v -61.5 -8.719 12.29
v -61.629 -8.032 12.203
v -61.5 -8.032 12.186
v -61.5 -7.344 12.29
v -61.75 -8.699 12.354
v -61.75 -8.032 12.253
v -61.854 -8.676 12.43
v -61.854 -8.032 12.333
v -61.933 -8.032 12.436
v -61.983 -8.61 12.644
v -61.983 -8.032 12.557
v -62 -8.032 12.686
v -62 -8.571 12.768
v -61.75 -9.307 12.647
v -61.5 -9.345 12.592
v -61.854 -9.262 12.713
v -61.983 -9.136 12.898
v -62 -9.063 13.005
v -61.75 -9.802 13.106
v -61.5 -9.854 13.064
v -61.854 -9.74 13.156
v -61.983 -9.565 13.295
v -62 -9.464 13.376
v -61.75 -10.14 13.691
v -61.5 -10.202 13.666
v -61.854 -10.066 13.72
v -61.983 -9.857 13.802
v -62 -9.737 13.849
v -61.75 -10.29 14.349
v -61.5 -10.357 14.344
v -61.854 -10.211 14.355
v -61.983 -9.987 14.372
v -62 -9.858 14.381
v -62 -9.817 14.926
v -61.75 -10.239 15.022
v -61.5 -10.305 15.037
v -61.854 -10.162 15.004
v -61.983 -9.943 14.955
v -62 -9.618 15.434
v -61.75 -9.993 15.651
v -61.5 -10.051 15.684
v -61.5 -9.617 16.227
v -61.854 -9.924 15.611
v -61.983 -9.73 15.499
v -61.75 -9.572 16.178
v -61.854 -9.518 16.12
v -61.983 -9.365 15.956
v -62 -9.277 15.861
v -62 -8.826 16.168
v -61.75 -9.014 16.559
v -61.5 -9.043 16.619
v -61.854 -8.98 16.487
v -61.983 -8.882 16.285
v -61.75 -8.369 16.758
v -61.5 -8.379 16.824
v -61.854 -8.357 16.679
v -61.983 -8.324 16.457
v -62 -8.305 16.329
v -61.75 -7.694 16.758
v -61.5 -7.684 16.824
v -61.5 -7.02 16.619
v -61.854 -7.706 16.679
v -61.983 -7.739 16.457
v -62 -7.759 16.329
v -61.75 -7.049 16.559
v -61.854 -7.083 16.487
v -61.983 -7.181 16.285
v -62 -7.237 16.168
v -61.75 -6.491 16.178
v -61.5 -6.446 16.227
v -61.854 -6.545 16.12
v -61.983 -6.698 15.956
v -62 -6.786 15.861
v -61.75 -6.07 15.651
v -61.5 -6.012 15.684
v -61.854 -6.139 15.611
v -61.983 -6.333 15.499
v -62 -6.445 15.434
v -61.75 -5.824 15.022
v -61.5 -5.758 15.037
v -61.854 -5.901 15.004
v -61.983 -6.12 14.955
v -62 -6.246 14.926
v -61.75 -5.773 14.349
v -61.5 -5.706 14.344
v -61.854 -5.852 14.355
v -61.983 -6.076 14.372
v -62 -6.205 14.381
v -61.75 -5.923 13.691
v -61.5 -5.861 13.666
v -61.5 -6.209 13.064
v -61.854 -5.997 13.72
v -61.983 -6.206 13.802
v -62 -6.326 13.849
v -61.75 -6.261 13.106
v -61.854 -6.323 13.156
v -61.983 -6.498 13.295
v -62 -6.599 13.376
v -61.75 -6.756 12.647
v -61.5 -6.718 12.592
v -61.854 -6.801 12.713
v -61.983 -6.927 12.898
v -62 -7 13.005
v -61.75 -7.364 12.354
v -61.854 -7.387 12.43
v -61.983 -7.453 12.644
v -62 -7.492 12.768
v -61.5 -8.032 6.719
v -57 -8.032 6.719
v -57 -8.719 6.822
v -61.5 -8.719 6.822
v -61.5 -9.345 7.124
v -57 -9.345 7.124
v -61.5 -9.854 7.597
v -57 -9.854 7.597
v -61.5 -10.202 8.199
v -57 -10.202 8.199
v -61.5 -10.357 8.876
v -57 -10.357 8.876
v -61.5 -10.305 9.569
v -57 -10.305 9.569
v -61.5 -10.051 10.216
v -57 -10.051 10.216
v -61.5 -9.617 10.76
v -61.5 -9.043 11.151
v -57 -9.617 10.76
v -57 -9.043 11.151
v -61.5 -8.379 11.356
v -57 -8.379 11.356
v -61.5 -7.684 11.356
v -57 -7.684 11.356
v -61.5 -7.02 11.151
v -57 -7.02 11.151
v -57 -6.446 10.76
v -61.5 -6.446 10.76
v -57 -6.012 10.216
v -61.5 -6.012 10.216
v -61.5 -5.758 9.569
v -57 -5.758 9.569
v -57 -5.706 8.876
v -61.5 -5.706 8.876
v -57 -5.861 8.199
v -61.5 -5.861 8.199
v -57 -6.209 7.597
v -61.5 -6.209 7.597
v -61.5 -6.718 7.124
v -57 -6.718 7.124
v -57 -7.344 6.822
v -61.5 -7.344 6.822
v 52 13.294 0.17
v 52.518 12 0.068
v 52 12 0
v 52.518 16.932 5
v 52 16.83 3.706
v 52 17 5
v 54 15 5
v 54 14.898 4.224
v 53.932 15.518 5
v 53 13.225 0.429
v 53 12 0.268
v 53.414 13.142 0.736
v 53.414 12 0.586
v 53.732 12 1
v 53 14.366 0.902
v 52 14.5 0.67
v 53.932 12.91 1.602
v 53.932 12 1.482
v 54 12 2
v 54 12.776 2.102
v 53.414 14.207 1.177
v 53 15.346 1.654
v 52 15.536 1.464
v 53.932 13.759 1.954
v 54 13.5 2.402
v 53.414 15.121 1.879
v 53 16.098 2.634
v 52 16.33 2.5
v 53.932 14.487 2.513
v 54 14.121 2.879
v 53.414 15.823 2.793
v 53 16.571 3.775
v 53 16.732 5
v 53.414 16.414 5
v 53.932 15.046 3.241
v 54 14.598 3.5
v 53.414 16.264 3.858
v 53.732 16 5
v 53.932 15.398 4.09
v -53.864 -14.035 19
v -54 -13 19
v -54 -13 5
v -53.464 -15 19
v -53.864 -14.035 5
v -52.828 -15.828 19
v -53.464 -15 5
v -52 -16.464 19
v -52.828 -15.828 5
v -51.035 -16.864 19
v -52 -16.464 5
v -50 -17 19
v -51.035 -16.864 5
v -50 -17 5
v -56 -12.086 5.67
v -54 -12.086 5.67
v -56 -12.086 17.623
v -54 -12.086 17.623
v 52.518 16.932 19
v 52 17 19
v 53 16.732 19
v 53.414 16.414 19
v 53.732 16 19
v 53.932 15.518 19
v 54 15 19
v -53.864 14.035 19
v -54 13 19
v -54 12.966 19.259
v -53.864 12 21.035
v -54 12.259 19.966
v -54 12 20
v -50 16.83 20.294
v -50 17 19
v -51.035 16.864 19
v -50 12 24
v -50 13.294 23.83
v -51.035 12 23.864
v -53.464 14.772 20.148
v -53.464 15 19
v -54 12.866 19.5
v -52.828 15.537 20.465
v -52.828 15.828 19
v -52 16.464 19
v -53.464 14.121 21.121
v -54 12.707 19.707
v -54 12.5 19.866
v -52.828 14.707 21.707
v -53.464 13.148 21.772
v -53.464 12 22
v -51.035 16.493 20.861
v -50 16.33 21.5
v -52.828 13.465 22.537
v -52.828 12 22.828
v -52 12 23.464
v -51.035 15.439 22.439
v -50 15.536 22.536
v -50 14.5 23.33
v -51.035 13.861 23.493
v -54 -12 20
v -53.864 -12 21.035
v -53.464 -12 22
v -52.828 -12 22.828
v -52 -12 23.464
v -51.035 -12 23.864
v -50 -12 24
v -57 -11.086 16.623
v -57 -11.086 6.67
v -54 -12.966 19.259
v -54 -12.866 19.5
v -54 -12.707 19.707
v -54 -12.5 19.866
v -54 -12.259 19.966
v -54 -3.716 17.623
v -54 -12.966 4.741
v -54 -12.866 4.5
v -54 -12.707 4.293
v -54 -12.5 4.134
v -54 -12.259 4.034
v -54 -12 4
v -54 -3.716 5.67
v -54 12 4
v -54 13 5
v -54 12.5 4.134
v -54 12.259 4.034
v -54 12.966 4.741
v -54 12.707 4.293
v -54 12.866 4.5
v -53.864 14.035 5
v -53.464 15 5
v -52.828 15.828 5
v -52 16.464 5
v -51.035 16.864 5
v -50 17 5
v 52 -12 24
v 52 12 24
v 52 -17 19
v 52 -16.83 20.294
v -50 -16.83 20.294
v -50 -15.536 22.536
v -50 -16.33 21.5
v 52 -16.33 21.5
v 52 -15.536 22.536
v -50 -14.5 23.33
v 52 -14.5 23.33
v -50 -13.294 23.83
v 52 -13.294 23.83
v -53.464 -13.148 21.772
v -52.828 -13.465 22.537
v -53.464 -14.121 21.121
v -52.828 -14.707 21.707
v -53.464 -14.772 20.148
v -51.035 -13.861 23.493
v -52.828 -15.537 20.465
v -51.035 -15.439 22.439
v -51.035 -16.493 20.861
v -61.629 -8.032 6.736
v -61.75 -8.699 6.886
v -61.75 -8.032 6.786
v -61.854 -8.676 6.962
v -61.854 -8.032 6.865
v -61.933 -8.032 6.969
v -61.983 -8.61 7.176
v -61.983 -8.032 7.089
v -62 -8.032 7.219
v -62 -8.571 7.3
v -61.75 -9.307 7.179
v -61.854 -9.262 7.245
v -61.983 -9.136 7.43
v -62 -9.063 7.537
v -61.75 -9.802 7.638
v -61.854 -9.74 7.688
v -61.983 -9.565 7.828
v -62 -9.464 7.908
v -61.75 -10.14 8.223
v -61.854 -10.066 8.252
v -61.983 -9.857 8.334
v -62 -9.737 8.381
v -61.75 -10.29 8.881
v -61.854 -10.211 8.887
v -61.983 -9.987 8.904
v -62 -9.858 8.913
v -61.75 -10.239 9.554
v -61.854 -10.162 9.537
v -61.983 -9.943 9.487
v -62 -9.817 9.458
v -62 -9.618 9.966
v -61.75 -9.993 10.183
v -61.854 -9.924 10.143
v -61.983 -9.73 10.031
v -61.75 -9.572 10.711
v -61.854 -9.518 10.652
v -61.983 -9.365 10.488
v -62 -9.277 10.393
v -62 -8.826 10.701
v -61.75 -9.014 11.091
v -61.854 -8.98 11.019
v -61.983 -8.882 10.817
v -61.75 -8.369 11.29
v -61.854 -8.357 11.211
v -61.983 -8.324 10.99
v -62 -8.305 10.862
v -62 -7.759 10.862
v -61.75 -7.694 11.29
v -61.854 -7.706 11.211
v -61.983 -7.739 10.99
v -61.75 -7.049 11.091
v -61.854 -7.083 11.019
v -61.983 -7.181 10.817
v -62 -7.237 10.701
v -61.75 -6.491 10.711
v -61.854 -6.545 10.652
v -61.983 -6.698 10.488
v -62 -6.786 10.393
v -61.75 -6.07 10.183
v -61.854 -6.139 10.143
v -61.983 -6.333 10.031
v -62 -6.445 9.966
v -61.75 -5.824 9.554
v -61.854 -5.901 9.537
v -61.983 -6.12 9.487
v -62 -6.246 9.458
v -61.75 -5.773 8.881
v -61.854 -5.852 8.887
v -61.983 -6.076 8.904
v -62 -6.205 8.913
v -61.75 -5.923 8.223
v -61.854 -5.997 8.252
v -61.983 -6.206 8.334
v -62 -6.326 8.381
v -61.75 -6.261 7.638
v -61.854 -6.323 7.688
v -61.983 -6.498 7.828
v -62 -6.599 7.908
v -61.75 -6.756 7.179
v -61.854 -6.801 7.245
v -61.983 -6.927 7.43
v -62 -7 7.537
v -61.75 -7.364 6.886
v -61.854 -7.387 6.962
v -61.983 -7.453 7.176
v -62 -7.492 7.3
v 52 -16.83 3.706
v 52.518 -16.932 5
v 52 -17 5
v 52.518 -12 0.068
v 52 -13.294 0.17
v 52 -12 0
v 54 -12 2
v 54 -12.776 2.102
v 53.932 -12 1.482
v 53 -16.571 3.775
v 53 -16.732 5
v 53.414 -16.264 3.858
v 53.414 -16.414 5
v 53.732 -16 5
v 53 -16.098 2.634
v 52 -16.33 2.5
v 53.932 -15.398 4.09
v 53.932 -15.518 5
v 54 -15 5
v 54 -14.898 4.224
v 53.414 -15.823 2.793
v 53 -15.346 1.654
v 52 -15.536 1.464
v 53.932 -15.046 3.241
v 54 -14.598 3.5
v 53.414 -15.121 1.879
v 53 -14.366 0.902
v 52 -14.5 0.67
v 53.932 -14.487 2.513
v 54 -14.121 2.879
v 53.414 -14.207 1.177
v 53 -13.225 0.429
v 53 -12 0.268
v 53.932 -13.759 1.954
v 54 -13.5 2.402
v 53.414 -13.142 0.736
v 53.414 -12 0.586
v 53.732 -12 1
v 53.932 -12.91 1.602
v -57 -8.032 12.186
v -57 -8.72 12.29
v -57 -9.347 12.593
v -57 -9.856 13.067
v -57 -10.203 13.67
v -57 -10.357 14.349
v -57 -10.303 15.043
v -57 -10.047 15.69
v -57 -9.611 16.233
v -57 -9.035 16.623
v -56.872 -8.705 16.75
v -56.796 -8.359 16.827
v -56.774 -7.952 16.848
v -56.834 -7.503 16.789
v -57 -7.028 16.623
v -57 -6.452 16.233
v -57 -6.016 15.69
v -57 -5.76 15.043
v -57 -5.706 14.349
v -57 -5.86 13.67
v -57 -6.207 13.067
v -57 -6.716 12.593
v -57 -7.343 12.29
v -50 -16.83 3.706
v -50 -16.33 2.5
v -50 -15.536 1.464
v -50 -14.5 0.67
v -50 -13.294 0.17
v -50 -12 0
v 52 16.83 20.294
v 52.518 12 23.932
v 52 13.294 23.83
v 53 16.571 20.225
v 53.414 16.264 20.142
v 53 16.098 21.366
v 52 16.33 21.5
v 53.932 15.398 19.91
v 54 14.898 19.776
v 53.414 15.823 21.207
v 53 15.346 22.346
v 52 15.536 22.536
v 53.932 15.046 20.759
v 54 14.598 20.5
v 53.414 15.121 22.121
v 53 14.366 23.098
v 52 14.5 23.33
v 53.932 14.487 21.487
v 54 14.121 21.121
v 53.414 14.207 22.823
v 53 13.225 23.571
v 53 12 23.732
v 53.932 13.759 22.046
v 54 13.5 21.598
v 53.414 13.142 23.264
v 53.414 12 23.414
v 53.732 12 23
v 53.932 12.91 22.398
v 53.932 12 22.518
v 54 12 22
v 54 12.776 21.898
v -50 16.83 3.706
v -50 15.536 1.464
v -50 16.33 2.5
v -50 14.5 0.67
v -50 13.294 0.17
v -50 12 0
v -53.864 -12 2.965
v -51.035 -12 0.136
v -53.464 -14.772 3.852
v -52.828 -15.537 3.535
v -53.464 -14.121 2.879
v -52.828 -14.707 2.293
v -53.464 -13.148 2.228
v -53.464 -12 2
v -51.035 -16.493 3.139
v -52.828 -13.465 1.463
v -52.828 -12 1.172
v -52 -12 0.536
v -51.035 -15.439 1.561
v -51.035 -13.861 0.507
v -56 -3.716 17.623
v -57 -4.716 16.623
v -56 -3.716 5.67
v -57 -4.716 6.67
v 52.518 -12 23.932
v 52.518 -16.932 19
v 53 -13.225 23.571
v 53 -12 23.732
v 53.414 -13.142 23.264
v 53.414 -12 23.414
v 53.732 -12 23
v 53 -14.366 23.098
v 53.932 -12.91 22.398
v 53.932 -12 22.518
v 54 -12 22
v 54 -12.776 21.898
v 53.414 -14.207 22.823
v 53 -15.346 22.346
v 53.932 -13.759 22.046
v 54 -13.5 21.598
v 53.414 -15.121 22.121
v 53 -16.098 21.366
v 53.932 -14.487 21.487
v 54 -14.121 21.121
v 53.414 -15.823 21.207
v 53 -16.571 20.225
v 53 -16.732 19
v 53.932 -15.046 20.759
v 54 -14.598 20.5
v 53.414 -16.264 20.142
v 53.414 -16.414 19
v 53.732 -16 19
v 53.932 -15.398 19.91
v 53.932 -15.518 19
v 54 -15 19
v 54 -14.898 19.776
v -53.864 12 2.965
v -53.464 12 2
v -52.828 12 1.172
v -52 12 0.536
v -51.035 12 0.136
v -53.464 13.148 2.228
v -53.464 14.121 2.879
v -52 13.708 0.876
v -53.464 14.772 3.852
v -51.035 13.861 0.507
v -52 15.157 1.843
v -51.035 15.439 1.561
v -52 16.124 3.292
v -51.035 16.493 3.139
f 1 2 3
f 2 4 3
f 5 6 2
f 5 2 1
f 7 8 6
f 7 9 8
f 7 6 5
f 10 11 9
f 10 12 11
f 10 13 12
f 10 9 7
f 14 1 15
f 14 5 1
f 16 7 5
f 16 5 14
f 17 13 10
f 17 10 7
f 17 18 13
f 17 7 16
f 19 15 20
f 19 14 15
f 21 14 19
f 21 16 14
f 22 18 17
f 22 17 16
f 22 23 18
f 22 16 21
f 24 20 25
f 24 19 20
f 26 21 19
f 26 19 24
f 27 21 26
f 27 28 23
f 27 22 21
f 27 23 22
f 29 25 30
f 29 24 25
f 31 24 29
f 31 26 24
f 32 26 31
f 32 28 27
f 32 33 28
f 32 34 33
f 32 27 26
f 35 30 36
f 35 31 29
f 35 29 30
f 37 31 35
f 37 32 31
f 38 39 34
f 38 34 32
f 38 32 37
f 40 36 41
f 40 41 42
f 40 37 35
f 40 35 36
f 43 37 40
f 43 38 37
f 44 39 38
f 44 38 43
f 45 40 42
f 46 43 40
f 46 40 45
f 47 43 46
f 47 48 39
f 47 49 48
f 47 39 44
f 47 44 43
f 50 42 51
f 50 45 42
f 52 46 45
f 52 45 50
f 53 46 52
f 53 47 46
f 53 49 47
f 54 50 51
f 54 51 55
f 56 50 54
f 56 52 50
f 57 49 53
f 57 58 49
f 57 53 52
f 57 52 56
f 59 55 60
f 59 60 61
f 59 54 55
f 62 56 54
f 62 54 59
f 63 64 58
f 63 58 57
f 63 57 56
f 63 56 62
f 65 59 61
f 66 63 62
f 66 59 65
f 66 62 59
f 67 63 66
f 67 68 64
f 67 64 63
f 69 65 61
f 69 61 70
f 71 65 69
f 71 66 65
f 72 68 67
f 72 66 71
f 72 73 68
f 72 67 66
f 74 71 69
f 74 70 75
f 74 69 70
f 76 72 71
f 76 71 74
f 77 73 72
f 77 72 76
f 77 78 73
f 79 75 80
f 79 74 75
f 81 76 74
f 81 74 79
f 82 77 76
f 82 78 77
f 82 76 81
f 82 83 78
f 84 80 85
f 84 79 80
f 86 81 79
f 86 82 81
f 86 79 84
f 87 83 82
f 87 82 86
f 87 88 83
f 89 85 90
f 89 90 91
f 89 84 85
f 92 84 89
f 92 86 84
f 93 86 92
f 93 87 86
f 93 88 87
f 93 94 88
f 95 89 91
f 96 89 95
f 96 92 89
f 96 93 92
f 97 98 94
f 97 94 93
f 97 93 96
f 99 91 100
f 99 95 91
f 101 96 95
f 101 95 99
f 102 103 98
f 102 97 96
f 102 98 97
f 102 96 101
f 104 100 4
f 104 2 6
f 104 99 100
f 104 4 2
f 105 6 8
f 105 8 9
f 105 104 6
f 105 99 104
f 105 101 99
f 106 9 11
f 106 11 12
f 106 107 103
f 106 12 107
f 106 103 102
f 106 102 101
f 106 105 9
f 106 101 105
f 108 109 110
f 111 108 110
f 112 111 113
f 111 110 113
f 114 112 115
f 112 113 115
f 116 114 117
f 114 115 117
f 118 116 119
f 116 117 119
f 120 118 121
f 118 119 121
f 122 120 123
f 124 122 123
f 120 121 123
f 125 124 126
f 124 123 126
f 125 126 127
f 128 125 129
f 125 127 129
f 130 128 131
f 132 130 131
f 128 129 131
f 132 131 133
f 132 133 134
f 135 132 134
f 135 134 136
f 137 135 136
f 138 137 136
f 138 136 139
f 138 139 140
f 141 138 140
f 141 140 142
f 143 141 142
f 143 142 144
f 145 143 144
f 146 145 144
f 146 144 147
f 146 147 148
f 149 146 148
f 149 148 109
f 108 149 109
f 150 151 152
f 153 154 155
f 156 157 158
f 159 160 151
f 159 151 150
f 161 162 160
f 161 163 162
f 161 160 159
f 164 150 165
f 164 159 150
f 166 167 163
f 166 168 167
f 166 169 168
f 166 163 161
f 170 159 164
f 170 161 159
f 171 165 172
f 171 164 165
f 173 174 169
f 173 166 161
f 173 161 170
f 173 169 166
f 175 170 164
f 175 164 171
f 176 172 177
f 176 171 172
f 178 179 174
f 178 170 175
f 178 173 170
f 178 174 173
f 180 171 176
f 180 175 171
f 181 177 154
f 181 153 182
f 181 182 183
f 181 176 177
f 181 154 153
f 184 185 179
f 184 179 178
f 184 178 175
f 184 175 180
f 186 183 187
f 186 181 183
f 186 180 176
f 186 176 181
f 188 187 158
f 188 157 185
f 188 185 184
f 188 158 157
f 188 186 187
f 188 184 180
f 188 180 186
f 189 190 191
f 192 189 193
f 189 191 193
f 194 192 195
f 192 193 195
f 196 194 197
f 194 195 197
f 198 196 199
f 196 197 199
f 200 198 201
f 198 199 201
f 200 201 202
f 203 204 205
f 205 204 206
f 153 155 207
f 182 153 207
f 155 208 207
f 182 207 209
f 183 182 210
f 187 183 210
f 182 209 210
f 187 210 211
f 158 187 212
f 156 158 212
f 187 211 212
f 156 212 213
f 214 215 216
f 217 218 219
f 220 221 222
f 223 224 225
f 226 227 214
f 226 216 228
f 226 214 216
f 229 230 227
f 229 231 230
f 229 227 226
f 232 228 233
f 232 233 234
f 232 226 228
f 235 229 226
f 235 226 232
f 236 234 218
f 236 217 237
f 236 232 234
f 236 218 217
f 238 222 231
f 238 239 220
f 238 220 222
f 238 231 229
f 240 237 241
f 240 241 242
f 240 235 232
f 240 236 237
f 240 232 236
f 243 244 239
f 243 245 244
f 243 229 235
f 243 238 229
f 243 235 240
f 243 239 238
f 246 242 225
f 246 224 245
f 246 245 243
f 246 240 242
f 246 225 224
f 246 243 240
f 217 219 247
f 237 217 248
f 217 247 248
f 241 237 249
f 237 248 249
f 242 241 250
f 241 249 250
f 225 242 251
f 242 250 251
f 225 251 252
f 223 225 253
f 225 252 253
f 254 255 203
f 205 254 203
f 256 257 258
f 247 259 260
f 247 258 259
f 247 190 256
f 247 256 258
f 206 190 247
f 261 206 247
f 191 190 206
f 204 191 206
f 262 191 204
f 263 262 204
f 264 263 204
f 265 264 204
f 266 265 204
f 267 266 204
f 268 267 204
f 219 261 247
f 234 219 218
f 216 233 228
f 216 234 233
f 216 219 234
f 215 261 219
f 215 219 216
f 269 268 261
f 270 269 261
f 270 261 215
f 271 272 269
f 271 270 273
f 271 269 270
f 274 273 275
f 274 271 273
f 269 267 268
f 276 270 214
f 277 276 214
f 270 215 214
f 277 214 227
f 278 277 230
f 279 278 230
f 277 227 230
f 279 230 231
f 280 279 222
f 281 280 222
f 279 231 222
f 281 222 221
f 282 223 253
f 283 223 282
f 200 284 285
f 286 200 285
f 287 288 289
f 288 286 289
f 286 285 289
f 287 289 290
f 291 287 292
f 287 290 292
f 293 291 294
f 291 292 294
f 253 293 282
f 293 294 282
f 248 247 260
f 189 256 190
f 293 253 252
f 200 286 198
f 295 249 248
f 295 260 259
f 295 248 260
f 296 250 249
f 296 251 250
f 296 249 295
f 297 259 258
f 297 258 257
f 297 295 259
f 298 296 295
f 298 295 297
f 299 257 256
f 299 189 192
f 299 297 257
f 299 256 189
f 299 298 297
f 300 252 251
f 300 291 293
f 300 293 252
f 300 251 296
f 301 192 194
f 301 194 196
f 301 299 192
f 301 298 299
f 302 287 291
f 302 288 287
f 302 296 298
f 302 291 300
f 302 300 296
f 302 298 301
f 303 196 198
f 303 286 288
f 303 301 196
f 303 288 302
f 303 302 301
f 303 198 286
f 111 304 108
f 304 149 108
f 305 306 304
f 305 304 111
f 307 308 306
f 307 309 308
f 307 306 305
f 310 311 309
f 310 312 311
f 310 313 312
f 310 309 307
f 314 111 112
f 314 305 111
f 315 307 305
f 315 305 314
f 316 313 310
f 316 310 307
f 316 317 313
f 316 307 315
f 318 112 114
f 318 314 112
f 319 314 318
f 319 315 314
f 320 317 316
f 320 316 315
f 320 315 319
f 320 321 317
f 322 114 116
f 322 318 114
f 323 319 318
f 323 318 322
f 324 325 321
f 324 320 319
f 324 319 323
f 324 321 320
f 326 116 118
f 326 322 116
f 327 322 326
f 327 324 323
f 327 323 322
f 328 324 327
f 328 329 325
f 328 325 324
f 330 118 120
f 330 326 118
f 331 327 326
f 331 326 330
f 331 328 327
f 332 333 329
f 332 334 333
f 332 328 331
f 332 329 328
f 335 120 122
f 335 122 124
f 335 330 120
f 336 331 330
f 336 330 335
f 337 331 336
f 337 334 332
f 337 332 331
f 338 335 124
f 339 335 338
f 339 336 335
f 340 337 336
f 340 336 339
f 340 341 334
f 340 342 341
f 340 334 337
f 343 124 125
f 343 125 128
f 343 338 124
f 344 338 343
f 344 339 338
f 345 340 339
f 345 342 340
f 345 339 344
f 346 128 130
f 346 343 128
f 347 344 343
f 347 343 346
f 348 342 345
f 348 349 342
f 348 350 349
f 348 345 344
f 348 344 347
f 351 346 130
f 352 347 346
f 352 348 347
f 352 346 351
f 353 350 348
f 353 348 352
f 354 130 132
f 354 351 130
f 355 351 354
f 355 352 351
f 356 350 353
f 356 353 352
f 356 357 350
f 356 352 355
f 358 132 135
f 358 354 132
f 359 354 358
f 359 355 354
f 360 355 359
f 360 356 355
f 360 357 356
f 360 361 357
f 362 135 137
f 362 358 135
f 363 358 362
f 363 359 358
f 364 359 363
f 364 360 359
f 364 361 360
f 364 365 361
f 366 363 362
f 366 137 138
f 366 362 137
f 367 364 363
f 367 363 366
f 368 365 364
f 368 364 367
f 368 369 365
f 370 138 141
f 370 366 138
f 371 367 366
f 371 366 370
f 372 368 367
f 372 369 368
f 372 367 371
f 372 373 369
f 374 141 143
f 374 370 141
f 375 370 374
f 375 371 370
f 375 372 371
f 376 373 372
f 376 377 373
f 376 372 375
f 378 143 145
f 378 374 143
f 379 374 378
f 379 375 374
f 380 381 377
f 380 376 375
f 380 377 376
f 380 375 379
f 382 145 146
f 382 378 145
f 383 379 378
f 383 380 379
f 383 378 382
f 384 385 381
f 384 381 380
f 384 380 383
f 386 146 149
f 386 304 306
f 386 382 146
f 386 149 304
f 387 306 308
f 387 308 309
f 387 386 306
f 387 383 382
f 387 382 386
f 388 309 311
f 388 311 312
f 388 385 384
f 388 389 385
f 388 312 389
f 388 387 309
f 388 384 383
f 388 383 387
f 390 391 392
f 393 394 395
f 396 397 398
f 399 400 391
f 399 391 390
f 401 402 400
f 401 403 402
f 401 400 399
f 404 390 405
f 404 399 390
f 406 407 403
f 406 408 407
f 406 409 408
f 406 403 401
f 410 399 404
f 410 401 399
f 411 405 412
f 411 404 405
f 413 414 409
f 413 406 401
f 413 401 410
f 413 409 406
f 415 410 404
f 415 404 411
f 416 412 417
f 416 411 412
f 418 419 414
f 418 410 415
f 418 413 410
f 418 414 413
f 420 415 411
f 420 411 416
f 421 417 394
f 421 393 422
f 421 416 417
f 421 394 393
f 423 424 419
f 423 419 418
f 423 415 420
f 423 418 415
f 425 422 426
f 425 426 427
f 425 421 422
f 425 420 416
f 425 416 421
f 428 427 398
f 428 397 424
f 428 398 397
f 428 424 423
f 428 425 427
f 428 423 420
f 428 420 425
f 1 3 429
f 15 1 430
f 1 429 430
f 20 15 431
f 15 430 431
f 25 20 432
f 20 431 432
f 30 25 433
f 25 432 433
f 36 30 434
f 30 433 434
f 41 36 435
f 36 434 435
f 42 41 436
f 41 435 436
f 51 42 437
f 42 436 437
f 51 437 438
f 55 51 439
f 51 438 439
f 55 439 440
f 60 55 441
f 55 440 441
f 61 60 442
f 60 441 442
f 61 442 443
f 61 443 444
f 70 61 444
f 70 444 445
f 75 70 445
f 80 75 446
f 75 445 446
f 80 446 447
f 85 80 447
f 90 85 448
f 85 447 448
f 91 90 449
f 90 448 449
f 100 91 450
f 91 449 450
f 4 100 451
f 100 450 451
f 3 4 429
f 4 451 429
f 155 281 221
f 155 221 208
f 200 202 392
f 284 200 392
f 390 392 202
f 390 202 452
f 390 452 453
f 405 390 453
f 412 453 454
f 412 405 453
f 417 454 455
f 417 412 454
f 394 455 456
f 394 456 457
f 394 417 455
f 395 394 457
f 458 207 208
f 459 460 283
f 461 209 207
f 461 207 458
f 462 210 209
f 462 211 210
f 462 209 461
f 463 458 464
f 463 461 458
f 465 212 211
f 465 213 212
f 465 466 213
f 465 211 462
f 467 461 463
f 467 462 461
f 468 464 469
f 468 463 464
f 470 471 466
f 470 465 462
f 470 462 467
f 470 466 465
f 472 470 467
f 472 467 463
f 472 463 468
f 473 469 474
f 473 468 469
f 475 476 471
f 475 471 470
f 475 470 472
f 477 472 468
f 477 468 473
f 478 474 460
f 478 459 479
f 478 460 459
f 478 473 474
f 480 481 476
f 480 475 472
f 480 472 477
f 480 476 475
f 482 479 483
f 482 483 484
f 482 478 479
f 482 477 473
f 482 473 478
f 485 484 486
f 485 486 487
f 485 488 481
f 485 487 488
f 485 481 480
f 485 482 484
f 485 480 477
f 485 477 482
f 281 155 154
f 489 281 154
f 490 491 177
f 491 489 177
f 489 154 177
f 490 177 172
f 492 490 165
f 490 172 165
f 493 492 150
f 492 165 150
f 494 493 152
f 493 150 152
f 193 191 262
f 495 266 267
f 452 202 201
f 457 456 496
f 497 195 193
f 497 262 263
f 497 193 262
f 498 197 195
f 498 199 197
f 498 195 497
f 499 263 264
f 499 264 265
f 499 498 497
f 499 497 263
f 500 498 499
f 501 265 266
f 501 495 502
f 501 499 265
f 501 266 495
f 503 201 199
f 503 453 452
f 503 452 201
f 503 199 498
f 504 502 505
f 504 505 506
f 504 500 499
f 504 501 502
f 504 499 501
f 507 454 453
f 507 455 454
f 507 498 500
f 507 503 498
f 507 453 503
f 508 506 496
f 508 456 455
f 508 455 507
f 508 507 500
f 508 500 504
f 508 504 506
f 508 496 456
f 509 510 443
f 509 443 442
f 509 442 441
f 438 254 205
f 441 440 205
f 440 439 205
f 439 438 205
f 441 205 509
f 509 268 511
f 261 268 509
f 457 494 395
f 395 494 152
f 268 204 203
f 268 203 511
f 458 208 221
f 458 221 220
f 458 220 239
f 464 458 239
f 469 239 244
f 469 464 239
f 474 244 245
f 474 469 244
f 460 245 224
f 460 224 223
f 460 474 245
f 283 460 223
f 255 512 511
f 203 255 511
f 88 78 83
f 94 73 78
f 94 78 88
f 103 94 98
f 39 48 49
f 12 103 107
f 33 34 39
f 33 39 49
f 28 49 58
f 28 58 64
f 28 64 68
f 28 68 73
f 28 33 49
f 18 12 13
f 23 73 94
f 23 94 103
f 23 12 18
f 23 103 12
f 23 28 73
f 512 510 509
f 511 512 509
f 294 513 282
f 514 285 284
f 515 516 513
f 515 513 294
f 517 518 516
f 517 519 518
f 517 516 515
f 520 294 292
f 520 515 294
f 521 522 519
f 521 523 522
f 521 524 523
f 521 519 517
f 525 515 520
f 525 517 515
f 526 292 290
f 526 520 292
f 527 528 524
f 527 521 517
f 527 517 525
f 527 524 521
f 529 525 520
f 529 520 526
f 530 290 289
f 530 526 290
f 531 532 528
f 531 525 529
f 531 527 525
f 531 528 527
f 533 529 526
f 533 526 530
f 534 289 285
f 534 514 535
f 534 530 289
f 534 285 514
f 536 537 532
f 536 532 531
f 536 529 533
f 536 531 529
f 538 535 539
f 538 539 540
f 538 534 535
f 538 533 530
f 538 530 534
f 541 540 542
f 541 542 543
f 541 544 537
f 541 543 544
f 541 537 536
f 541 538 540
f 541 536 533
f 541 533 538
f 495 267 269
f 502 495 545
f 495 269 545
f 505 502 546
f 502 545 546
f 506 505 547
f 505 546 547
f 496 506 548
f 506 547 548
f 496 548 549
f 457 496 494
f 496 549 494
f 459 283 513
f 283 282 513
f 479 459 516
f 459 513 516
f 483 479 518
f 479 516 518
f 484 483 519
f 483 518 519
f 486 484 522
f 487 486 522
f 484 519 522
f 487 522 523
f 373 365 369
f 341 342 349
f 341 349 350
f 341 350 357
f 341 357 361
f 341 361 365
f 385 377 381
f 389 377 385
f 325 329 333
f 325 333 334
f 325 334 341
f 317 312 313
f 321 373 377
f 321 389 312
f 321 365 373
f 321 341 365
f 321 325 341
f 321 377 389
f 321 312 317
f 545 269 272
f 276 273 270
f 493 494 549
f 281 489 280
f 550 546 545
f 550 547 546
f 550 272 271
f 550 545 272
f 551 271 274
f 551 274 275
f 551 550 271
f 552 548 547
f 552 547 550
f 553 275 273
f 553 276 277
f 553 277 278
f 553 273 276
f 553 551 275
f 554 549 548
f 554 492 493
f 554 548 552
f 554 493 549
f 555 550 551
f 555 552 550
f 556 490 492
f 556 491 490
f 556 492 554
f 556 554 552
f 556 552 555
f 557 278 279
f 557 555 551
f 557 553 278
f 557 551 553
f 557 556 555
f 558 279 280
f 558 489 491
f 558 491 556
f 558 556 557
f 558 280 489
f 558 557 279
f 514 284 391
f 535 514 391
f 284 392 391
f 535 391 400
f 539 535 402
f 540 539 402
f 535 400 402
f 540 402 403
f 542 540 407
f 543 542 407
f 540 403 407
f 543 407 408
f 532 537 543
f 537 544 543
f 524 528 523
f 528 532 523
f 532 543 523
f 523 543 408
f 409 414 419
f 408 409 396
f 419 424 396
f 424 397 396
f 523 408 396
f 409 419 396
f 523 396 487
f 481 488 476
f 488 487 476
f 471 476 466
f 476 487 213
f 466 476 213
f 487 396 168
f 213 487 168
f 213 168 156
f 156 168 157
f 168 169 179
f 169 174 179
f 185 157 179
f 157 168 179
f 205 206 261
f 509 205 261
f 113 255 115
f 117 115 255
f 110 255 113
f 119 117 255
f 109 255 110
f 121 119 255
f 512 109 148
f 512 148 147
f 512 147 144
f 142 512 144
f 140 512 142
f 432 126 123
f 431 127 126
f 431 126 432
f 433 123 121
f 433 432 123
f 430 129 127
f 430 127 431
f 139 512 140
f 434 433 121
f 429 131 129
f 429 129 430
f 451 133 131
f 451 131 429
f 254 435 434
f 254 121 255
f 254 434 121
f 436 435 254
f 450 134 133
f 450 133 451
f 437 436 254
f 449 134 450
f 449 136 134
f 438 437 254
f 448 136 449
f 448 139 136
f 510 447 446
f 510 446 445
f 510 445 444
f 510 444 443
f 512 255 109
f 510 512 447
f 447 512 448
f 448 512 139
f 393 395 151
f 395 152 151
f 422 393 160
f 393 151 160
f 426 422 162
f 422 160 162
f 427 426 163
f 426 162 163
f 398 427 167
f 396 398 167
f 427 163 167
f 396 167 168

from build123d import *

# Parameters (mm, degrees)
SKETCH1_W           = 108
SKETCH1_H           = 34
BOSS_EXTRUDE1_DEPTH = 24
FILLET1_R           = 5
SKETCH2_W           = 11.95330434
SKETCH2_H           = 8.370070963
BOSS_EXTRUDE2_DEPTH = 3
SKETCH4_R           = 2.331694998
BOSS_EXTRUDE3_DEPTH = 8
FILLET2_R           = 0.5
CHAMFER1_SIZE       = 1
FILLET4_R           = 4
FILLET5_R           = 2


with BuildPart() as part:
    # Sketch1 → Boss-Extrude1 (new body)
    with BuildSketch(Plane.XY):
        Rectangle(SKETCH1_W, SKETCH1_H)
    extrude(amount=BOSS_EXTRUDE1_DEPTH)

    # Fillet1
    fillet1_edges = [part.edges().sort_by_distance(p)[0] for p in [
        (0, -17, 24),
        (0, -17, 0),
        (0, 17, 0),
        (0, 17, 24),
    ]]
    fillet(fillet1_edges, radius=FILLET1_R)

    # Sketch2 → Boss-Extrude2 (add)
    with BuildSketch(Plane.ZY.offset(54)):
        with Locations((11.64622902, -7.901268425)):
            Rectangle(SKETCH2_W, SKETCH2_H)
    extrude(amount=BOSS_EXTRUDE2_DEPTH)

    # Sketch4 → Boss-Extrude3 (add)
    with BuildSketch(Plane.ZY.offset(54)):
        with Locations(Location((14.518147435, -8.031501174, 0), (0, 0, 180))):
            Circle(SKETCH4_R)
        with Locations(Location((9.050368945, -8.031501174, 0), (0, 0, 180))):
            Circle(SKETCH4_R)
    extrude(amount=BOSS_EXTRUDE3_DEPTH)

    # Fillet2
    fillet2_edges = [part.edges().sort_by_distance(p)[0] for p in [
        (-62, -8.031501174, 16.849842433),
        (-62, -8.031501174, 11.382063944),
    ]]
    fillet(fillet2_edges, radius=FILLET2_R)

    # Chamfer1
    # the kernel refuses this chamfer: 1 mm, written as the material it takes off along each edge
    with BuildSketch(Plane(origin=(-57, -14.657986894, 17.62288119), x_dir=(-0.0274958766105891, 0, -0.9996219169112968), z_dir=(0, 1, 0))) as chamfer1_piece_1_section:
        Polygon((CHAMFER1_SIZE * 0.999621916911, -CHAMFER1_SIZE * 0.0274958766106), (-CHAMFER1_SIZE * 0.0274958766106, -CHAMFER1_SIZE * 0.999621916911), (0, 0), align=None)
    chamfer1_piece_1 = extrude(amount=13.513436938, mode=Mode.PRIVATE)
    chamfer1_piece_1 = chamfer1_piece_1 - Plane(origin=(-56.66854021, -8.031501174, 14.518147435), x_dir=(0, 0, -1), z_dir=(1, 0, 0)) * Cylinder(2.331694998, 32, mode=Mode.PRIVATE)
    add(chamfer1_piece_1, mode=Mode.SUBTRACT)
    with BuildSketch(Plane(origin=(-57, -3.716232943, 20.194564177), x_dir=(-0.02749587661058907, -0.9996219169112965, 0), z_dir=(0, 0, -1)), Plane(origin=(-57, -12.086303906, 3.097893862), x_dir=(-0.0274958766105891, 0.9996219169112968, 0), z_dir=(0, 0, 1))) as chamfer1_piece_2:
        Polygon((CHAMFER1_SIZE * 0.999621916911, -CHAMFER1_SIZE * 0.0274958766106), (-CHAMFER1_SIZE * 0.0274958766106, -CHAMFER1_SIZE * 0.999621916911), (0, 0), align=None)
    extrude(amount=17.096670315, mode=Mode.SUBTRACT)
    with BuildSketch(Plane(origin=(-57, -1.144549955, 5.66957685), x_dir=(-0.02749587661058907, 0, 0.9996219169112965), z_dir=(0, -1, 0))) as chamfer1_piece_3:
        Polygon((CHAMFER1_SIZE * 0.999621916911, -CHAMFER1_SIZE * 0.0274958766106), (-CHAMFER1_SIZE * 0.0274958766106, -CHAMFER1_SIZE * 0.999621916911), (0, 0), align=None)
    extrude(amount=13.513436938, mode=Mode.SUBTRACT)

    # Fillet4
    fillet4_edges = [part.edges().sort_by_distance(p)[0] for p in [
        (-54, 17, 12),
        (-54, 0, 0),
        (-54, -17, 12),
        (-54, 0, 24),
        (-54, -15.535533906, 22.535533906),
        (-54, -15.535533906, 1.464466094),
        (-54, 15.535533906, 22.535533906),
        (-54, 15.535533906, 1.464466094),
    ]]
    fillet(fillet4_edges, radius=FILLET4_R)

    # Fillet5
    fillet5_edges = [part.edges().sort_by_distance(p)[0] for p in [
        (54, 17, 12),
        (54, 0, 0),
        (54, 0, 24),
        (54, -17, 12),
        (54, -15.535533906, 22.535533906),
        (54, -15.535533906, 1.464466094),
        (54, 15.535533906, 22.535533906),
        (54, 15.535533906, 1.464466094),
    ]]
    fillet(fillet5_edges, radius=FILLET5_R)


solid = part.part
